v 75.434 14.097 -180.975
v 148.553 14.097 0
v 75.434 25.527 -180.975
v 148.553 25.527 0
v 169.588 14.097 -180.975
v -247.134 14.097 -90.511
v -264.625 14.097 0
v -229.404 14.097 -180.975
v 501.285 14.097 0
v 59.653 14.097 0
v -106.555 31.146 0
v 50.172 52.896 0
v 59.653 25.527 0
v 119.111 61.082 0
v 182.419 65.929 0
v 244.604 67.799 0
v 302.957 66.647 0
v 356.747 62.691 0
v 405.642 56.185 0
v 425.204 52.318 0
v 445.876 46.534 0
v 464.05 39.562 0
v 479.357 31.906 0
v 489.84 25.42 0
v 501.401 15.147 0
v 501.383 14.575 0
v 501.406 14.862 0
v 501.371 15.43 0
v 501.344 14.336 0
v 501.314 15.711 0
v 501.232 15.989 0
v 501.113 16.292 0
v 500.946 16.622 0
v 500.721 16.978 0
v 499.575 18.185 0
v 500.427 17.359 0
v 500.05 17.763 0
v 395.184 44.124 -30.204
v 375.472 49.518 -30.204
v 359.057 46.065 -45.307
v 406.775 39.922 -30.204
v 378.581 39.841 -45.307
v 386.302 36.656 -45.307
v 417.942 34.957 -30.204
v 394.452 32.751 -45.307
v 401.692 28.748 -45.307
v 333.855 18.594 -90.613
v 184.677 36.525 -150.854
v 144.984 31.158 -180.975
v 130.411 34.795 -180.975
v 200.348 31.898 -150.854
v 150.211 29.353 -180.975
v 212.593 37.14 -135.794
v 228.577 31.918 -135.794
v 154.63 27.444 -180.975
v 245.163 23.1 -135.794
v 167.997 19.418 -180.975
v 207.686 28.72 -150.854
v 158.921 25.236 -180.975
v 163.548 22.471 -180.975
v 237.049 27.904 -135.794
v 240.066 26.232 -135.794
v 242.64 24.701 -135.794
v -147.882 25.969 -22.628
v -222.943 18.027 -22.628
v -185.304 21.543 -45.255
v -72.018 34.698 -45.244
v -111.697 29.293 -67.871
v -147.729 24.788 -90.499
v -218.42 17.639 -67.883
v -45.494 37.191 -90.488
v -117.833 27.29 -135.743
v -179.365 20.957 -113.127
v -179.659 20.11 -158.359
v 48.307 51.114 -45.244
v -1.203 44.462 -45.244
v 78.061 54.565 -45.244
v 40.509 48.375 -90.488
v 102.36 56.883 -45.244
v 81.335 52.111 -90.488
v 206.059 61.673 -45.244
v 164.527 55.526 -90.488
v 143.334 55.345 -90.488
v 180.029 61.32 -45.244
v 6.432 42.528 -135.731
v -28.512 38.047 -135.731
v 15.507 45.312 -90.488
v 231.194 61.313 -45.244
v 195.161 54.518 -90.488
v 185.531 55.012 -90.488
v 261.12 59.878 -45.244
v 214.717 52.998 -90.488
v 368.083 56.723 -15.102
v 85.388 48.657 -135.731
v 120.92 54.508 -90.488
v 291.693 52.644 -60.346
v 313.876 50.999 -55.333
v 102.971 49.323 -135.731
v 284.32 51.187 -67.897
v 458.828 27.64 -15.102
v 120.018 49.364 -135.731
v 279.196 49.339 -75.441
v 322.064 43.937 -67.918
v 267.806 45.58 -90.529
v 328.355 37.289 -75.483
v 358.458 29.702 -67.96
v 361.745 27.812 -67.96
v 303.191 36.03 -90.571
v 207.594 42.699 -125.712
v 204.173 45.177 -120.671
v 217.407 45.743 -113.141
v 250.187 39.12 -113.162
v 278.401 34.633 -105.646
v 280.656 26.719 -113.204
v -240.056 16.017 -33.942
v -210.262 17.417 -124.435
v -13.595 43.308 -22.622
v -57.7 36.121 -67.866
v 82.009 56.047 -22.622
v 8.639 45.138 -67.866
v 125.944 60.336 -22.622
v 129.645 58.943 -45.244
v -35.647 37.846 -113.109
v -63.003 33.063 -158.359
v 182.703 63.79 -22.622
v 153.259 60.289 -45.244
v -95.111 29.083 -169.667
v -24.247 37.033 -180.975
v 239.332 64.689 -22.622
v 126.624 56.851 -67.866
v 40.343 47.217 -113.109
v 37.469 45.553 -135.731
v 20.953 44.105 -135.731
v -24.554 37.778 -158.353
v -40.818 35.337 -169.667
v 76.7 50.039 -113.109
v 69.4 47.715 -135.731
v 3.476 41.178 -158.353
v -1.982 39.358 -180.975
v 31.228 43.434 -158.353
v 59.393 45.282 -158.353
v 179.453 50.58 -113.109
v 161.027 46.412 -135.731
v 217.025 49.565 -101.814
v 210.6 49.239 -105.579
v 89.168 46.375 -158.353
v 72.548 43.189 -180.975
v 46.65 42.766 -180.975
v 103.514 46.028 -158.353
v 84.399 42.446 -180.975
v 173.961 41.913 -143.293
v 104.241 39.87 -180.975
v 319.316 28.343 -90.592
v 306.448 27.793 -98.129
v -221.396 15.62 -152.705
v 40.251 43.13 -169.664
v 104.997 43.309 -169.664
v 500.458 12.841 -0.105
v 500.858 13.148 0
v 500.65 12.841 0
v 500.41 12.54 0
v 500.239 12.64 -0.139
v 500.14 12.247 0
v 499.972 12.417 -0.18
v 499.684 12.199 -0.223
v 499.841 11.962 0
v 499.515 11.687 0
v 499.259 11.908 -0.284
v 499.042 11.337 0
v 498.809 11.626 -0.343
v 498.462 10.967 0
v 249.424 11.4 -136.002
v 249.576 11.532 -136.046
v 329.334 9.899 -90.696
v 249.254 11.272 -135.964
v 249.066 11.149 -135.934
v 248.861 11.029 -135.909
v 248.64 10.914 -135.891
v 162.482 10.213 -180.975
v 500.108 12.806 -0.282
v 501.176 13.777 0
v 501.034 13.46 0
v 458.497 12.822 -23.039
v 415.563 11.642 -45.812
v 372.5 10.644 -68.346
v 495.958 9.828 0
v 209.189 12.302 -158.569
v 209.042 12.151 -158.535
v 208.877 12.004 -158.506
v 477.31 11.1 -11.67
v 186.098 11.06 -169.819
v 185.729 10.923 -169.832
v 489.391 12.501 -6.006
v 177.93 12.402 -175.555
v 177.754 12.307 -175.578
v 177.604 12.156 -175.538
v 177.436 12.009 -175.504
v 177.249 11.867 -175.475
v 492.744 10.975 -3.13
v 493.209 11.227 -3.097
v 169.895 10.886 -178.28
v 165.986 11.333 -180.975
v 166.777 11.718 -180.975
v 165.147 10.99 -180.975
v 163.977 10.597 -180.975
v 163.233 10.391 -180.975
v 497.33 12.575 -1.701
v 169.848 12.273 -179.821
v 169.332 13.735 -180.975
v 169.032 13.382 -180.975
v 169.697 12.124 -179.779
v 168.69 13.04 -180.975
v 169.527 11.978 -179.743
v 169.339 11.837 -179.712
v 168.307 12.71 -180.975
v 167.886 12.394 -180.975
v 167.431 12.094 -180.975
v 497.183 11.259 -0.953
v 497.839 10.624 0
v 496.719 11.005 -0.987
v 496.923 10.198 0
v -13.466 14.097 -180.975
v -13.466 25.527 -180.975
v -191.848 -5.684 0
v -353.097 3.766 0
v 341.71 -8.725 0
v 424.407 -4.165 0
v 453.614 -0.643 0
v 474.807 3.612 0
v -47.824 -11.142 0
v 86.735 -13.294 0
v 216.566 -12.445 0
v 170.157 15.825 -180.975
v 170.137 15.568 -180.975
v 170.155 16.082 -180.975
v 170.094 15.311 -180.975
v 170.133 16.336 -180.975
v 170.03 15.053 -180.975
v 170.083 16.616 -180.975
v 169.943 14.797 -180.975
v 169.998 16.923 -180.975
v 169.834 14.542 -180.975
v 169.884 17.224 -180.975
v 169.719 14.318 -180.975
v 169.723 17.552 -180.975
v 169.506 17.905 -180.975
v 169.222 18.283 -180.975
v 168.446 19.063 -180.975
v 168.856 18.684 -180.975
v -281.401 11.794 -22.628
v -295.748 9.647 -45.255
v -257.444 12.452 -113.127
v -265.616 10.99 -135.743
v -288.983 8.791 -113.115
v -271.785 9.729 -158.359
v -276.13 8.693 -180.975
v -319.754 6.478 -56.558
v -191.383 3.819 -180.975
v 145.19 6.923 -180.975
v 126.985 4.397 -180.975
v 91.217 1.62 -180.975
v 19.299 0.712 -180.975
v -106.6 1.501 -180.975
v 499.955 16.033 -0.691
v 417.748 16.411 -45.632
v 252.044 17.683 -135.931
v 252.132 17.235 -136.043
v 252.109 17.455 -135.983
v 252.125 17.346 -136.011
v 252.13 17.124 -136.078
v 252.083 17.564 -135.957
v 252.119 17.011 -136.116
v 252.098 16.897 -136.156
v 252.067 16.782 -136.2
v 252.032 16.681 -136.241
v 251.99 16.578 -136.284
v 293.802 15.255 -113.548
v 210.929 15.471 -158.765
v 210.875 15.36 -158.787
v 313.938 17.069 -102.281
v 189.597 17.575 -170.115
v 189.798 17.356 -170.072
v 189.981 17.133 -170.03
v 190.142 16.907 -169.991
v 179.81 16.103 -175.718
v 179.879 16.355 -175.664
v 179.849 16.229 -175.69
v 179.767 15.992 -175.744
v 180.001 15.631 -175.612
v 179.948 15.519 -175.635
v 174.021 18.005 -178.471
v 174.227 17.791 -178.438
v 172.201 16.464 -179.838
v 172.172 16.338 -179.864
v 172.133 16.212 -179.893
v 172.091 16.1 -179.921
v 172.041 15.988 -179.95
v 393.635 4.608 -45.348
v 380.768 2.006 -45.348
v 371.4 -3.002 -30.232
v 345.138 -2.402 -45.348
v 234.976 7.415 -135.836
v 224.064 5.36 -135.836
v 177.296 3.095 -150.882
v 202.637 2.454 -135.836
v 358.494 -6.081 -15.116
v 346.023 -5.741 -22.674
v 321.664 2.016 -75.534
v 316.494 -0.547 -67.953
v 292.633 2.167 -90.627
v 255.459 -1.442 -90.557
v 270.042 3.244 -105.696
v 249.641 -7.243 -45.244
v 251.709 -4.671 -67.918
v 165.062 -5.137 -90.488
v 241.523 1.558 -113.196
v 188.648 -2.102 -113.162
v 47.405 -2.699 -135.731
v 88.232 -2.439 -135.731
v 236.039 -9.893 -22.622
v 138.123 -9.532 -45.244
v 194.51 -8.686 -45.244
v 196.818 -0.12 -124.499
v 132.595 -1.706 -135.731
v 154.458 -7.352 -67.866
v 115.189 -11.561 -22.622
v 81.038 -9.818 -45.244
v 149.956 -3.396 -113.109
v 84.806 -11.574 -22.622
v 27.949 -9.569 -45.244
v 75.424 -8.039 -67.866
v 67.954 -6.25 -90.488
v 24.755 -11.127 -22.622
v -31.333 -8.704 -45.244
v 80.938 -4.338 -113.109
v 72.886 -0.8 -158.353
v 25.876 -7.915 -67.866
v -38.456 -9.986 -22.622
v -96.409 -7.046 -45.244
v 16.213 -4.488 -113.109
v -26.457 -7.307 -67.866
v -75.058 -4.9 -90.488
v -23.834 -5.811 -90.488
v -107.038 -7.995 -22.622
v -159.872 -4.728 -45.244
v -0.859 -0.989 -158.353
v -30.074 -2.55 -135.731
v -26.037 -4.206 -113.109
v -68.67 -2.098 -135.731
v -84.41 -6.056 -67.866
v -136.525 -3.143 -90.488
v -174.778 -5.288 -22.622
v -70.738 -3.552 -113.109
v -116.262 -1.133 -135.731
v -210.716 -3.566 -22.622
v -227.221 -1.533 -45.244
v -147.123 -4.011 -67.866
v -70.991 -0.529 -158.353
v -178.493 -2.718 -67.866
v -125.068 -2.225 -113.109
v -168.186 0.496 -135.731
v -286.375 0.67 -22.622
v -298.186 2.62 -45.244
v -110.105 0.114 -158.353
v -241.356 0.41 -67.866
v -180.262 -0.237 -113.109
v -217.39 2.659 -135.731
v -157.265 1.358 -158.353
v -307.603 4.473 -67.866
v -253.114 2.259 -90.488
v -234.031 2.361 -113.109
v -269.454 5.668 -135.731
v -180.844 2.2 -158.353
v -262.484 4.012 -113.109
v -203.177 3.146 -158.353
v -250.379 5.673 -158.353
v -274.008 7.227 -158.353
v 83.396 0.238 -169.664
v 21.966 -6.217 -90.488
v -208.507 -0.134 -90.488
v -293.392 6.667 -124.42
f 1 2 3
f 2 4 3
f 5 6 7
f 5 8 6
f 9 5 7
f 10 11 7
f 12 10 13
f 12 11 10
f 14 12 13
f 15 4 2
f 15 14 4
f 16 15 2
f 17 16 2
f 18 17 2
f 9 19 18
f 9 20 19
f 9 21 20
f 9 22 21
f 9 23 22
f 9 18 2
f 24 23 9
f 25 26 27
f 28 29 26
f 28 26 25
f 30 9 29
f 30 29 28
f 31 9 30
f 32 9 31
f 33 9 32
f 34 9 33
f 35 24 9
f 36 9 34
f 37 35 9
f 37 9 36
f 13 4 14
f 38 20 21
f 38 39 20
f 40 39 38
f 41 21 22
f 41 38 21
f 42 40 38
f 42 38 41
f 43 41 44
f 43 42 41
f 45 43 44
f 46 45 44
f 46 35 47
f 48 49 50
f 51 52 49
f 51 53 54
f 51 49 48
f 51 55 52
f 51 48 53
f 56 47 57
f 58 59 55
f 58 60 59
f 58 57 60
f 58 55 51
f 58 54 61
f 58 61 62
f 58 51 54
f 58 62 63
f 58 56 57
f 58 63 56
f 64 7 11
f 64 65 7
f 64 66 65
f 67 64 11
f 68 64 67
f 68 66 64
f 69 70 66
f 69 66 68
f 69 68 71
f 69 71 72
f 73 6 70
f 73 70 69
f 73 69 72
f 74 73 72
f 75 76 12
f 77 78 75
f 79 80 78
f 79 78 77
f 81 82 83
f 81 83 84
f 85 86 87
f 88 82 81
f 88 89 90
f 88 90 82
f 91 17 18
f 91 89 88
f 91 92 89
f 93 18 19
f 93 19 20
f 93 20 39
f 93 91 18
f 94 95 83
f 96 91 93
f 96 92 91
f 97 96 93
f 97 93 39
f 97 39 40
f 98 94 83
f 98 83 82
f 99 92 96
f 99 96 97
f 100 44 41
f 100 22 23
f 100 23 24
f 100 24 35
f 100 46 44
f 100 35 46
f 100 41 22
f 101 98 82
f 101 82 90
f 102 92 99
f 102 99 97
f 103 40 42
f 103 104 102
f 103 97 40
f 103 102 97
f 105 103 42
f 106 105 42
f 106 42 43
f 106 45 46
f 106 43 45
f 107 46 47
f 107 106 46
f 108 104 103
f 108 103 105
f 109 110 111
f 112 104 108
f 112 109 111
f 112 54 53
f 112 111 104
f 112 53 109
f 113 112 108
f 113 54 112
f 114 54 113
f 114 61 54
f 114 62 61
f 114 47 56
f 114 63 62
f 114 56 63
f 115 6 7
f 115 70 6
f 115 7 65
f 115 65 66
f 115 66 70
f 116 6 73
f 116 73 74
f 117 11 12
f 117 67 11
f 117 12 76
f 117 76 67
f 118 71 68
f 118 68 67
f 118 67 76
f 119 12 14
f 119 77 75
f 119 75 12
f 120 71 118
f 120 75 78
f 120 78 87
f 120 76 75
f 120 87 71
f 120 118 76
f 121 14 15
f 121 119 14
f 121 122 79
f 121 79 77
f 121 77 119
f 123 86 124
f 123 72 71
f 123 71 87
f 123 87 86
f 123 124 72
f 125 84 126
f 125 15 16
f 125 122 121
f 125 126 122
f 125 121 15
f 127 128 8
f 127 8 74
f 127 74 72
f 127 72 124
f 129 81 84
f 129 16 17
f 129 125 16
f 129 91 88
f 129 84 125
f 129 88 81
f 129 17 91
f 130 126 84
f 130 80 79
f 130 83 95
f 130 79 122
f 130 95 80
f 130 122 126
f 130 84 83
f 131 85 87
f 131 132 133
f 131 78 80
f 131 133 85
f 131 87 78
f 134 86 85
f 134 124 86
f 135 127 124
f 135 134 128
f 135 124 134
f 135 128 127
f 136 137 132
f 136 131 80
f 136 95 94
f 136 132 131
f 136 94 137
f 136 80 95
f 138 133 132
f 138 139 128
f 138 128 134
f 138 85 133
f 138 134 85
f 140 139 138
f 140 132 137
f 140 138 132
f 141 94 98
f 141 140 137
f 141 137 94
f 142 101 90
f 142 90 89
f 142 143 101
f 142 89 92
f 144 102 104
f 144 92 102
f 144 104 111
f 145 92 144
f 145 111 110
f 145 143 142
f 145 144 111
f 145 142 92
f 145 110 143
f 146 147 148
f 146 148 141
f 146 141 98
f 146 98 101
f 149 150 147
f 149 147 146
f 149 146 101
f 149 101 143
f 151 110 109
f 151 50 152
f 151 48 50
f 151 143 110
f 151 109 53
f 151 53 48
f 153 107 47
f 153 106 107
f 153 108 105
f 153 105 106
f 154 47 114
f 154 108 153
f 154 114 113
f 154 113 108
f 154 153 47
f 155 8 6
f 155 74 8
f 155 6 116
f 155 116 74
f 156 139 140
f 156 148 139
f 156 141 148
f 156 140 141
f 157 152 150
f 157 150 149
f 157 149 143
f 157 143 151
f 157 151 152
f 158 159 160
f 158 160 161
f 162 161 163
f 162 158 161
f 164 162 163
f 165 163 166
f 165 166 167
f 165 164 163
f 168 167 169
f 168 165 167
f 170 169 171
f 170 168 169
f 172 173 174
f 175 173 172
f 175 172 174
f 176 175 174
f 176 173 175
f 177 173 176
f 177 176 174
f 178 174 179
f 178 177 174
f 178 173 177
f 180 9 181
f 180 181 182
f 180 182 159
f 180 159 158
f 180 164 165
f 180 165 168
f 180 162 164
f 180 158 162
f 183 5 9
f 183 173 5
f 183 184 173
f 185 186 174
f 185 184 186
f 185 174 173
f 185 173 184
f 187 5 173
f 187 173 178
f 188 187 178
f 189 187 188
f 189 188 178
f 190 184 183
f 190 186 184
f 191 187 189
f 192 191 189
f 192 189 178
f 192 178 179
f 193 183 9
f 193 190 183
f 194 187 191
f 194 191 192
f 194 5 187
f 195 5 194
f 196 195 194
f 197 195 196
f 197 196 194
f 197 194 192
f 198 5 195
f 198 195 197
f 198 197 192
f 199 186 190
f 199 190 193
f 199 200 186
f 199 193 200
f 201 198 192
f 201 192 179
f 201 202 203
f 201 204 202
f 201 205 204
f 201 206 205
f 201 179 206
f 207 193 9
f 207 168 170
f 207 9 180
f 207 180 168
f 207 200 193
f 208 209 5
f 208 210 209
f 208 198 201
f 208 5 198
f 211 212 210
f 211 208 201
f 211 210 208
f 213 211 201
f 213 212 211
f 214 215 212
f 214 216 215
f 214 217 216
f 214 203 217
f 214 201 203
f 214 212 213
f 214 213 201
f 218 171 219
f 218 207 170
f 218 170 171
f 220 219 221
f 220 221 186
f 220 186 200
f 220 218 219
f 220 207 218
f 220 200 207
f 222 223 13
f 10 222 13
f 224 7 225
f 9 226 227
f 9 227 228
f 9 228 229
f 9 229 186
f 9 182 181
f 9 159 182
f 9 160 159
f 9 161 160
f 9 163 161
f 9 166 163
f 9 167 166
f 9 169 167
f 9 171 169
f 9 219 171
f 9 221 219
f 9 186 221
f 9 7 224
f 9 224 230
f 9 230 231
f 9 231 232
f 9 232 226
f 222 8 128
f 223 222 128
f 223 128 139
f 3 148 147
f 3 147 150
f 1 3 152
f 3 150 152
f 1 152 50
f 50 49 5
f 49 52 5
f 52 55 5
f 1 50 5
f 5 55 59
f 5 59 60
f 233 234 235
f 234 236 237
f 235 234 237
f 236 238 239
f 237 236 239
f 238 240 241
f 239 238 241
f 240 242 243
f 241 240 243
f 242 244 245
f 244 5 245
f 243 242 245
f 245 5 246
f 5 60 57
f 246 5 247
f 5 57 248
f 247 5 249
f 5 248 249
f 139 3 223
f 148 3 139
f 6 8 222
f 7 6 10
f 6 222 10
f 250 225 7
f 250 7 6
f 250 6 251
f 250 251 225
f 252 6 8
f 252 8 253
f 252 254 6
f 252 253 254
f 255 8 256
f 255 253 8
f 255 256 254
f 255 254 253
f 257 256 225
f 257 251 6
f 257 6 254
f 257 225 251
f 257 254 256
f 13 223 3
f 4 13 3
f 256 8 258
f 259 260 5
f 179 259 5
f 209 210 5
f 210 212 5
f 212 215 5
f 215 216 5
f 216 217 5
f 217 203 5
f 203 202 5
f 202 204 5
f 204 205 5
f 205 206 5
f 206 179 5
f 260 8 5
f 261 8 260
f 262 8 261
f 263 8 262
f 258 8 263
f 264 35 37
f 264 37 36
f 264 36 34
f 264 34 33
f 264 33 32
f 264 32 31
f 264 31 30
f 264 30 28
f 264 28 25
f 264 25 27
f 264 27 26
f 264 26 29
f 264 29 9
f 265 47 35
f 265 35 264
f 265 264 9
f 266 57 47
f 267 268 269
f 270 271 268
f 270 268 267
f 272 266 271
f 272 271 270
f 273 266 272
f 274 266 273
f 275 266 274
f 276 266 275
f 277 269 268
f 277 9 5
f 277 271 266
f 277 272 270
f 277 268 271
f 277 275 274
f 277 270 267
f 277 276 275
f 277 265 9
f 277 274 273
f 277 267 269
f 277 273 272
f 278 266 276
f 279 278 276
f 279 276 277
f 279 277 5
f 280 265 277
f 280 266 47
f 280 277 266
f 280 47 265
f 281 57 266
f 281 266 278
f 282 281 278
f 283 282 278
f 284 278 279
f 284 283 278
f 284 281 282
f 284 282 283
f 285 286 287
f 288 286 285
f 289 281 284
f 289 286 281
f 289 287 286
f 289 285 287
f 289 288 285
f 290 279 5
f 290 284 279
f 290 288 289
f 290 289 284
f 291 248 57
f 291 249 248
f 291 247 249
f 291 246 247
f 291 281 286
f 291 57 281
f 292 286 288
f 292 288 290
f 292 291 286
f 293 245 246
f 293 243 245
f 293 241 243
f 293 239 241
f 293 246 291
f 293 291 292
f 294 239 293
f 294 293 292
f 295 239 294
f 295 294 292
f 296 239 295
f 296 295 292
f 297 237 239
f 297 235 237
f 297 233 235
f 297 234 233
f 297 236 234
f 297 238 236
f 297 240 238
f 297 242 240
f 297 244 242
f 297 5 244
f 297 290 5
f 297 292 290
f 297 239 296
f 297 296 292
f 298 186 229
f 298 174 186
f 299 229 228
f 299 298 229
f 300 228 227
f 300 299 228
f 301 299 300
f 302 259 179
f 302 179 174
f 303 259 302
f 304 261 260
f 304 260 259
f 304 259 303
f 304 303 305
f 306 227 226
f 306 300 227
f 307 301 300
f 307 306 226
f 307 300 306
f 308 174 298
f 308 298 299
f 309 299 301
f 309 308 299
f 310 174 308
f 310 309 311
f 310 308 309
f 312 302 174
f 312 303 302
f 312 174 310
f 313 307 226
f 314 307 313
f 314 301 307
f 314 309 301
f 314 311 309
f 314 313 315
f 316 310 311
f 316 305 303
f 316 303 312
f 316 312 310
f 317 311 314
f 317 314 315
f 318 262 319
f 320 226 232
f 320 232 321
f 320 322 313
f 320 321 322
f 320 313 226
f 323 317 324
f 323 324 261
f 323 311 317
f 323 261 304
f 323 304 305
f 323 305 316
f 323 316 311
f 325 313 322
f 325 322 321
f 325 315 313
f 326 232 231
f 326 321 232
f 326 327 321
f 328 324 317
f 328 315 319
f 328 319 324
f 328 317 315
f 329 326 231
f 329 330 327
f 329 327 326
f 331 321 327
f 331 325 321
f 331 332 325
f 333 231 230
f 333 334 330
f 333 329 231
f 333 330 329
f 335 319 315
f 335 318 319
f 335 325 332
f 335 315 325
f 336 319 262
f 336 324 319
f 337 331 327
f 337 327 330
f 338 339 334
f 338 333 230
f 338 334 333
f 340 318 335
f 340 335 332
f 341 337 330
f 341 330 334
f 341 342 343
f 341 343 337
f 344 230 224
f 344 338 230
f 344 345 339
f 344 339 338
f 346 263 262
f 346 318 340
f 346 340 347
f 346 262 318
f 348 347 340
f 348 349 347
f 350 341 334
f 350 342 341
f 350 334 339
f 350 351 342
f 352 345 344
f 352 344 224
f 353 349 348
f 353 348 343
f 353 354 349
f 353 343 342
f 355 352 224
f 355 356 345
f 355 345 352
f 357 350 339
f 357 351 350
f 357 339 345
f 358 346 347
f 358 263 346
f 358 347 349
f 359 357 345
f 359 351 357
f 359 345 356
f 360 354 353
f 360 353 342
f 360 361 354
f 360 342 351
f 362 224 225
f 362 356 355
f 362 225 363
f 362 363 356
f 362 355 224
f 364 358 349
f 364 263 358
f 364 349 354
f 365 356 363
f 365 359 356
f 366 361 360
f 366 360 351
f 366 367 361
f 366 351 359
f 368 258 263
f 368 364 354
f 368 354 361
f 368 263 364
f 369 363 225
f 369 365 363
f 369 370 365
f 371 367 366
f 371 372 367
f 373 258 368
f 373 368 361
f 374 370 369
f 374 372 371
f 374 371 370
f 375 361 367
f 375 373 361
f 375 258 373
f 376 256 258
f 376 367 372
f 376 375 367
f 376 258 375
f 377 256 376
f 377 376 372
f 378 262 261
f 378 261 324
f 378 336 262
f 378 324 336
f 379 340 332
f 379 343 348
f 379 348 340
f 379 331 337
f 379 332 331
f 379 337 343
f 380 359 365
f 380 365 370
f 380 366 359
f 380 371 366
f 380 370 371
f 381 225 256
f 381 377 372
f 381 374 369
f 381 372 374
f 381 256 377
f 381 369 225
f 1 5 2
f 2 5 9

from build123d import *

# Parameters (mm, degrees)
FILLET1_R          = 6.35
CUT_EXTRUDE1_DEPTH = 5.715


with BuildPart() as part:
    # Sketch1 → Loft1 section 0
    with BuildSketch(Plane.XY):
        with BuildLine():
            add(Edge.make_bspline(
                [(-353.097115344, 3.76640622), (-263.60988857, 15.489732087), (-103.405625954, 27.702523148), (139.625383809, 69.731889132), (320.600909148, 70.897971745), (447.029350736, 49.156772515), (484.461992977, 32.39779841), (505.225432444, 13.29140622)],
                knots=[0, 0, 0, 0, 0.308401543, 0.542913332, 0.850169973, 0.887176211, 1, 1, 1, 1], degree=3))
            add(Edge.make_bspline(
                [(-353.097115344, 3.76640622), (-171.204173065, -8.622681299), (70.681231732, -17.726989966), (367.634485174, -8.589262826), (467.934967897, -1.634661846), (505.225432444, 13.29140622)],
                knots=[0, 0, 0, 0, 0.625313044, 0.861778666, 1, 1, 1, 1], degree=3))
        make_face()
    # Sketch2 → Loft1 section 1
    with BuildSketch(Plane.XY.offset(-180.975)):
        with BuildLine():
            add(Edge.make_bspline(
                [(-276.130119323, 8.693130358), (-231.459725957, 13.892182525), (-160.606907467, 22.045765928), (-55.21857633, 32.848239562), (-5.484684229, 39.5878223), (20.294760191, 40.734135472), (52.215253795, 43.311195196), (77.433370096, 43.854837121), (107.657853328, 39.590984865), (131.131357877, 34.766526999), (149.499224412, 30.294140301), (163.418705178, 23.059137739), (171.530279946, 16.921852673), (175.269753602, 13.29140622)],
                knots=[0, 0, 0, 0, 0.247403676, 0.462108507, 0.504395118, 0.627983171, 0.653401948, 0.743134379, 0.818760812, 0.882434425, 0.924179622, 0.96050512, 1, 1, 1, 1], degree=3))
            add(Edge.make_bspline(
                [(-276.130119323, 8.693130358), (-174.260953063, 0.911239157), (-23.669401798, 0.683864032), (127.515095646, 0.681371654), (175.269753602, 13.29140622)],
                knots=[0, 0, 0, 0, 0.67646369, 1, 1, 1, 1], degree=3))
        make_face()
    loft()

    # Fillet1
    fillet1_edges = [part.edges().sort_by_distance(p)[0] for p in [
        (340.247593023, 13.29140622, -90.4875),
    ]]
    fillet(fillet1_edges, radius=FILLET1_R)

    # Sketch7 → Cut-Extrude1 (cut, symmetric)
    with BuildSketch(Plane(origin=(0, 19.812, 0), x_dir=(1, 0, 0), z_dir=(0, 1, 0))):
        Polygon((148.552884656, 0), (75.434238435, 180.975), (-13.465761565, 180.975), (59.652884656, 0), align=None)
    extrude(amount=CUT_EXTRUDE1_DEPTH, both=True, mode=Mode.SUBTRACT)


with BuildPart() as body_2:
    # Split1: the piece on the far side of the plane
    add(part.part)
    split(bisect_by=Plane.ZX.offset(14.097), keep=Keep.BOTTOM)


with BuildPart() as part_1:
    add(part.part)

    # Split1
    split(bisect_by=Plane.ZX.offset(14.097), keep=Keep.TOP)


solid = Compound([body_2.part, part_1.part])
